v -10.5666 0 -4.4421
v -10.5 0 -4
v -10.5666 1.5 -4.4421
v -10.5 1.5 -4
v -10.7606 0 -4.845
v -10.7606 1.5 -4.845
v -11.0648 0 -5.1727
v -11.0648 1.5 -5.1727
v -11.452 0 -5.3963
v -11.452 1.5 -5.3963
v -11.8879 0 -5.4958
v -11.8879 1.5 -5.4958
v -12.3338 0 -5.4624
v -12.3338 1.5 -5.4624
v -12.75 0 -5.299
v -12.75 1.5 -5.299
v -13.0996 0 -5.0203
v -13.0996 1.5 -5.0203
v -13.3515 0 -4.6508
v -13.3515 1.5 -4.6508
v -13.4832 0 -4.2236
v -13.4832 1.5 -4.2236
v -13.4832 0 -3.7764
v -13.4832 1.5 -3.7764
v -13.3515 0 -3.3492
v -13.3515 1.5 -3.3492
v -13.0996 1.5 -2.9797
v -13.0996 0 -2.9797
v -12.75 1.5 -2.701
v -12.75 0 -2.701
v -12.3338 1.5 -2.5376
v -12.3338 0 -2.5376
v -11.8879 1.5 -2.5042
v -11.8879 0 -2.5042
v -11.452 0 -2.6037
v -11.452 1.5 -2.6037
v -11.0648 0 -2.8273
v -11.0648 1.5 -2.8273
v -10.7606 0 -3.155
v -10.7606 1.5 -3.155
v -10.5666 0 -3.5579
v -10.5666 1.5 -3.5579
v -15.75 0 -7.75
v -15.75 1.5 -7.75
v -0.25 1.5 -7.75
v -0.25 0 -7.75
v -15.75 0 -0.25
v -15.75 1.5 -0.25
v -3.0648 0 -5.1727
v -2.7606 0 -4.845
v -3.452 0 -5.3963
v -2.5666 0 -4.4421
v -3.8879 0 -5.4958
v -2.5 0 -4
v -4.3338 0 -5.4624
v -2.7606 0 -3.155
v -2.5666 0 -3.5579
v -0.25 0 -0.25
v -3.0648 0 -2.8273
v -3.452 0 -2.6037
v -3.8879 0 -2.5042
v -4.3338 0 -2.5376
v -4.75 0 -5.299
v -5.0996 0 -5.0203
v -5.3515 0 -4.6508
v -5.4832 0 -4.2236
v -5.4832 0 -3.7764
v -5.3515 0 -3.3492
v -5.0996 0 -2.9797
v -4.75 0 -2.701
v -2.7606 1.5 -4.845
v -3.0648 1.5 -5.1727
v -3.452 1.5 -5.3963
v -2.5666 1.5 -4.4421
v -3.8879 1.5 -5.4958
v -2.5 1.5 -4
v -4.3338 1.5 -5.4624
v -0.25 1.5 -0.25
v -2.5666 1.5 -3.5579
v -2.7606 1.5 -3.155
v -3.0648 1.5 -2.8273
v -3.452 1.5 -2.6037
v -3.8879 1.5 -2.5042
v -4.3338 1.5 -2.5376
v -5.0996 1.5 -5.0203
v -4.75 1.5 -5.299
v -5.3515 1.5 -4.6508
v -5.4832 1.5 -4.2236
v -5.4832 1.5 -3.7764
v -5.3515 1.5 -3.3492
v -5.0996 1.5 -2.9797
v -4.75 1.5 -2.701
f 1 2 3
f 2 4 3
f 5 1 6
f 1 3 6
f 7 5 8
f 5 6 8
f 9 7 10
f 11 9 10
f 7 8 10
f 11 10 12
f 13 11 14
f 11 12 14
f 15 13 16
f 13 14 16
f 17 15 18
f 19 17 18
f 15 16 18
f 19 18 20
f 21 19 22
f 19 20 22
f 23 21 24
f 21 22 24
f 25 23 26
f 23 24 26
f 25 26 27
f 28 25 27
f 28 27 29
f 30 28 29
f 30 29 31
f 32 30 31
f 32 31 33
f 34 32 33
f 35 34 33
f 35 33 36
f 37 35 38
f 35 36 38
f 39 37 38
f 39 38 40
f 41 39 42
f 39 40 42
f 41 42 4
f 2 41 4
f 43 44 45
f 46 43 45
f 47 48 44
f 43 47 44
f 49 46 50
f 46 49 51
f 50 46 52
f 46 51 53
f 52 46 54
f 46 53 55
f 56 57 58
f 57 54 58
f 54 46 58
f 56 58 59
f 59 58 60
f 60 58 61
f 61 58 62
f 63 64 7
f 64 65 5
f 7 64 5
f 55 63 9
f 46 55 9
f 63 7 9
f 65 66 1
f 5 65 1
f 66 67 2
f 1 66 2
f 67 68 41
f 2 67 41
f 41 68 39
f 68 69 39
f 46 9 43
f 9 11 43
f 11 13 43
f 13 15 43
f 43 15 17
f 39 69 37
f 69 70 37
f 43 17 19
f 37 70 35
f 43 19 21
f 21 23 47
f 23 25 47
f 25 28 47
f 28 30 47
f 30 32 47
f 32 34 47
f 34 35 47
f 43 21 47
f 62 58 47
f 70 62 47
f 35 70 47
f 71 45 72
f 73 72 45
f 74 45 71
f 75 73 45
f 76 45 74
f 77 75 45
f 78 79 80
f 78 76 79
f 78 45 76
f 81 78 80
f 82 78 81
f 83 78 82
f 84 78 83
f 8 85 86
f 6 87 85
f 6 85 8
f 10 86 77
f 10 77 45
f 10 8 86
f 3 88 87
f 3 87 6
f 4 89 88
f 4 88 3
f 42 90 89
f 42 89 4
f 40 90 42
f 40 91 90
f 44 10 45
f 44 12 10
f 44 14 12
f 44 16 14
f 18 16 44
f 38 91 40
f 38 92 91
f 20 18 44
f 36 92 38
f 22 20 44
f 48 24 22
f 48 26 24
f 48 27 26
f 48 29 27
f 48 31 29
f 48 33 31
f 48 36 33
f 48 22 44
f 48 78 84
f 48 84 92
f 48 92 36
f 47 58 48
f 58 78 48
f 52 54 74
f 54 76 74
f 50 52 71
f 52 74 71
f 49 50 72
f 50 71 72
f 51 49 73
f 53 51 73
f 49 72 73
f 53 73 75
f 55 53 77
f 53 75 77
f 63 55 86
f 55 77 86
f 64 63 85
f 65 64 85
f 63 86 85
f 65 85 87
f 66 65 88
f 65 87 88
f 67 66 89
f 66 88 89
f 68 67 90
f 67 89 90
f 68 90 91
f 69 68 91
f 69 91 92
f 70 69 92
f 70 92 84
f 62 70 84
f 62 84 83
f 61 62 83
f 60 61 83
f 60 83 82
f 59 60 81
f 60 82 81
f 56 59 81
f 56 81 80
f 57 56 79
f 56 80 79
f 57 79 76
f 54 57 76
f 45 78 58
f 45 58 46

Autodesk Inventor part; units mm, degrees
ref_plane "YZ Plane" through (0, 0, 0) normal (1, 0, 0) x (0, 1, 0)
ref_plane "XZ Plane" through (0, 0, 0) normal (0, 1, 0) x (-1, 0, 0)
ref_plane "XY Plane" through (0, 0, 0) normal (0, 0, 1) x (1, 0, 0)
sketch "Sketch1" plane through (0, 0, 0) normal (0, 1, 0) x (-1, 0, 0)
  line L0 (0, 0) -> (16, 0)
  line L1 (16, 0) -> (16, -8)
  line L2 (16, -8) -> (0, -8)
  line L3 (0, -8) -> (0, 0)
  dimension "d0" = 16
  dimension "d1" = 8
extrude "Extrusion1" add sketch "Sketch1" along normal blind 1.5
sketch "Sketch2" plane through (0, 1.5, 0) normal (0, 1, 0) x (1, 0, 0)
  circle A0 centre (-4, 4) radius 1.5
  circle A1 centre (-12, 4) radius 1.5
  point P0 (0, 0)
  point P1 (-16, 0)
  dimension "d4" = 3
  dimension "d5" = 3
extrude "Extrusion2" cut sketch "Sketch2" against normal blind 1.5
sketch "Sketch3" plane through (0, 1.5, 0) normal (0, 1, 0) x (1, 0, 0)
  line L0 (-16, 0) -> (0, 0) projected
  line L1 (0, 0) -> (0, 8) projected
  line L2 (-16, 0) -> (0, 0)
  line L3 (0, 0) -> (0, 8)
  line L4 (0, 8) -> (-16, 8)
  line L5 (-16, 8) -> (-16, 0)
  line L6 (0, 0) -> (-0.25, 0)
  line L7 (-0.25, 0) -> (-0.25, 8)
  line L8 (0, 0) -> (0, 0.25)
  line L9 (0, 0.25) -> (-16, 0.25)
  line L10 (-16, 0) -> (-15.75, 0)
  line L11 (-15.75, 0) -> (-15.75, 8)
  line L12 (-16, 8) -> (-16, 7.75)
  line L13 (-16, 7.75) -> (-0.25, 7.75)
  point P0 (-0.25, 0.25)
  point P1 (-15.75, 0.25)
  point P2 (-15.75, 7.75)
  dimension "d8" = 0.25
  dimension "d9" = 0.25
  dimension "d10" = 0.25
  dimension "d11" = 0.25
extrude "Extrusion3" cut sketch "Sketch3" against normal blind 1.5 contours L5 L9 L11 L0 | L11 L9 L7 L0 | L5 L13 L11 L9 | L7 L9 L1 L0 | L5 L4 L11 L13 | L7 L4 L1 L9 | L11 L4 L7 L13
properties part number "connector"
